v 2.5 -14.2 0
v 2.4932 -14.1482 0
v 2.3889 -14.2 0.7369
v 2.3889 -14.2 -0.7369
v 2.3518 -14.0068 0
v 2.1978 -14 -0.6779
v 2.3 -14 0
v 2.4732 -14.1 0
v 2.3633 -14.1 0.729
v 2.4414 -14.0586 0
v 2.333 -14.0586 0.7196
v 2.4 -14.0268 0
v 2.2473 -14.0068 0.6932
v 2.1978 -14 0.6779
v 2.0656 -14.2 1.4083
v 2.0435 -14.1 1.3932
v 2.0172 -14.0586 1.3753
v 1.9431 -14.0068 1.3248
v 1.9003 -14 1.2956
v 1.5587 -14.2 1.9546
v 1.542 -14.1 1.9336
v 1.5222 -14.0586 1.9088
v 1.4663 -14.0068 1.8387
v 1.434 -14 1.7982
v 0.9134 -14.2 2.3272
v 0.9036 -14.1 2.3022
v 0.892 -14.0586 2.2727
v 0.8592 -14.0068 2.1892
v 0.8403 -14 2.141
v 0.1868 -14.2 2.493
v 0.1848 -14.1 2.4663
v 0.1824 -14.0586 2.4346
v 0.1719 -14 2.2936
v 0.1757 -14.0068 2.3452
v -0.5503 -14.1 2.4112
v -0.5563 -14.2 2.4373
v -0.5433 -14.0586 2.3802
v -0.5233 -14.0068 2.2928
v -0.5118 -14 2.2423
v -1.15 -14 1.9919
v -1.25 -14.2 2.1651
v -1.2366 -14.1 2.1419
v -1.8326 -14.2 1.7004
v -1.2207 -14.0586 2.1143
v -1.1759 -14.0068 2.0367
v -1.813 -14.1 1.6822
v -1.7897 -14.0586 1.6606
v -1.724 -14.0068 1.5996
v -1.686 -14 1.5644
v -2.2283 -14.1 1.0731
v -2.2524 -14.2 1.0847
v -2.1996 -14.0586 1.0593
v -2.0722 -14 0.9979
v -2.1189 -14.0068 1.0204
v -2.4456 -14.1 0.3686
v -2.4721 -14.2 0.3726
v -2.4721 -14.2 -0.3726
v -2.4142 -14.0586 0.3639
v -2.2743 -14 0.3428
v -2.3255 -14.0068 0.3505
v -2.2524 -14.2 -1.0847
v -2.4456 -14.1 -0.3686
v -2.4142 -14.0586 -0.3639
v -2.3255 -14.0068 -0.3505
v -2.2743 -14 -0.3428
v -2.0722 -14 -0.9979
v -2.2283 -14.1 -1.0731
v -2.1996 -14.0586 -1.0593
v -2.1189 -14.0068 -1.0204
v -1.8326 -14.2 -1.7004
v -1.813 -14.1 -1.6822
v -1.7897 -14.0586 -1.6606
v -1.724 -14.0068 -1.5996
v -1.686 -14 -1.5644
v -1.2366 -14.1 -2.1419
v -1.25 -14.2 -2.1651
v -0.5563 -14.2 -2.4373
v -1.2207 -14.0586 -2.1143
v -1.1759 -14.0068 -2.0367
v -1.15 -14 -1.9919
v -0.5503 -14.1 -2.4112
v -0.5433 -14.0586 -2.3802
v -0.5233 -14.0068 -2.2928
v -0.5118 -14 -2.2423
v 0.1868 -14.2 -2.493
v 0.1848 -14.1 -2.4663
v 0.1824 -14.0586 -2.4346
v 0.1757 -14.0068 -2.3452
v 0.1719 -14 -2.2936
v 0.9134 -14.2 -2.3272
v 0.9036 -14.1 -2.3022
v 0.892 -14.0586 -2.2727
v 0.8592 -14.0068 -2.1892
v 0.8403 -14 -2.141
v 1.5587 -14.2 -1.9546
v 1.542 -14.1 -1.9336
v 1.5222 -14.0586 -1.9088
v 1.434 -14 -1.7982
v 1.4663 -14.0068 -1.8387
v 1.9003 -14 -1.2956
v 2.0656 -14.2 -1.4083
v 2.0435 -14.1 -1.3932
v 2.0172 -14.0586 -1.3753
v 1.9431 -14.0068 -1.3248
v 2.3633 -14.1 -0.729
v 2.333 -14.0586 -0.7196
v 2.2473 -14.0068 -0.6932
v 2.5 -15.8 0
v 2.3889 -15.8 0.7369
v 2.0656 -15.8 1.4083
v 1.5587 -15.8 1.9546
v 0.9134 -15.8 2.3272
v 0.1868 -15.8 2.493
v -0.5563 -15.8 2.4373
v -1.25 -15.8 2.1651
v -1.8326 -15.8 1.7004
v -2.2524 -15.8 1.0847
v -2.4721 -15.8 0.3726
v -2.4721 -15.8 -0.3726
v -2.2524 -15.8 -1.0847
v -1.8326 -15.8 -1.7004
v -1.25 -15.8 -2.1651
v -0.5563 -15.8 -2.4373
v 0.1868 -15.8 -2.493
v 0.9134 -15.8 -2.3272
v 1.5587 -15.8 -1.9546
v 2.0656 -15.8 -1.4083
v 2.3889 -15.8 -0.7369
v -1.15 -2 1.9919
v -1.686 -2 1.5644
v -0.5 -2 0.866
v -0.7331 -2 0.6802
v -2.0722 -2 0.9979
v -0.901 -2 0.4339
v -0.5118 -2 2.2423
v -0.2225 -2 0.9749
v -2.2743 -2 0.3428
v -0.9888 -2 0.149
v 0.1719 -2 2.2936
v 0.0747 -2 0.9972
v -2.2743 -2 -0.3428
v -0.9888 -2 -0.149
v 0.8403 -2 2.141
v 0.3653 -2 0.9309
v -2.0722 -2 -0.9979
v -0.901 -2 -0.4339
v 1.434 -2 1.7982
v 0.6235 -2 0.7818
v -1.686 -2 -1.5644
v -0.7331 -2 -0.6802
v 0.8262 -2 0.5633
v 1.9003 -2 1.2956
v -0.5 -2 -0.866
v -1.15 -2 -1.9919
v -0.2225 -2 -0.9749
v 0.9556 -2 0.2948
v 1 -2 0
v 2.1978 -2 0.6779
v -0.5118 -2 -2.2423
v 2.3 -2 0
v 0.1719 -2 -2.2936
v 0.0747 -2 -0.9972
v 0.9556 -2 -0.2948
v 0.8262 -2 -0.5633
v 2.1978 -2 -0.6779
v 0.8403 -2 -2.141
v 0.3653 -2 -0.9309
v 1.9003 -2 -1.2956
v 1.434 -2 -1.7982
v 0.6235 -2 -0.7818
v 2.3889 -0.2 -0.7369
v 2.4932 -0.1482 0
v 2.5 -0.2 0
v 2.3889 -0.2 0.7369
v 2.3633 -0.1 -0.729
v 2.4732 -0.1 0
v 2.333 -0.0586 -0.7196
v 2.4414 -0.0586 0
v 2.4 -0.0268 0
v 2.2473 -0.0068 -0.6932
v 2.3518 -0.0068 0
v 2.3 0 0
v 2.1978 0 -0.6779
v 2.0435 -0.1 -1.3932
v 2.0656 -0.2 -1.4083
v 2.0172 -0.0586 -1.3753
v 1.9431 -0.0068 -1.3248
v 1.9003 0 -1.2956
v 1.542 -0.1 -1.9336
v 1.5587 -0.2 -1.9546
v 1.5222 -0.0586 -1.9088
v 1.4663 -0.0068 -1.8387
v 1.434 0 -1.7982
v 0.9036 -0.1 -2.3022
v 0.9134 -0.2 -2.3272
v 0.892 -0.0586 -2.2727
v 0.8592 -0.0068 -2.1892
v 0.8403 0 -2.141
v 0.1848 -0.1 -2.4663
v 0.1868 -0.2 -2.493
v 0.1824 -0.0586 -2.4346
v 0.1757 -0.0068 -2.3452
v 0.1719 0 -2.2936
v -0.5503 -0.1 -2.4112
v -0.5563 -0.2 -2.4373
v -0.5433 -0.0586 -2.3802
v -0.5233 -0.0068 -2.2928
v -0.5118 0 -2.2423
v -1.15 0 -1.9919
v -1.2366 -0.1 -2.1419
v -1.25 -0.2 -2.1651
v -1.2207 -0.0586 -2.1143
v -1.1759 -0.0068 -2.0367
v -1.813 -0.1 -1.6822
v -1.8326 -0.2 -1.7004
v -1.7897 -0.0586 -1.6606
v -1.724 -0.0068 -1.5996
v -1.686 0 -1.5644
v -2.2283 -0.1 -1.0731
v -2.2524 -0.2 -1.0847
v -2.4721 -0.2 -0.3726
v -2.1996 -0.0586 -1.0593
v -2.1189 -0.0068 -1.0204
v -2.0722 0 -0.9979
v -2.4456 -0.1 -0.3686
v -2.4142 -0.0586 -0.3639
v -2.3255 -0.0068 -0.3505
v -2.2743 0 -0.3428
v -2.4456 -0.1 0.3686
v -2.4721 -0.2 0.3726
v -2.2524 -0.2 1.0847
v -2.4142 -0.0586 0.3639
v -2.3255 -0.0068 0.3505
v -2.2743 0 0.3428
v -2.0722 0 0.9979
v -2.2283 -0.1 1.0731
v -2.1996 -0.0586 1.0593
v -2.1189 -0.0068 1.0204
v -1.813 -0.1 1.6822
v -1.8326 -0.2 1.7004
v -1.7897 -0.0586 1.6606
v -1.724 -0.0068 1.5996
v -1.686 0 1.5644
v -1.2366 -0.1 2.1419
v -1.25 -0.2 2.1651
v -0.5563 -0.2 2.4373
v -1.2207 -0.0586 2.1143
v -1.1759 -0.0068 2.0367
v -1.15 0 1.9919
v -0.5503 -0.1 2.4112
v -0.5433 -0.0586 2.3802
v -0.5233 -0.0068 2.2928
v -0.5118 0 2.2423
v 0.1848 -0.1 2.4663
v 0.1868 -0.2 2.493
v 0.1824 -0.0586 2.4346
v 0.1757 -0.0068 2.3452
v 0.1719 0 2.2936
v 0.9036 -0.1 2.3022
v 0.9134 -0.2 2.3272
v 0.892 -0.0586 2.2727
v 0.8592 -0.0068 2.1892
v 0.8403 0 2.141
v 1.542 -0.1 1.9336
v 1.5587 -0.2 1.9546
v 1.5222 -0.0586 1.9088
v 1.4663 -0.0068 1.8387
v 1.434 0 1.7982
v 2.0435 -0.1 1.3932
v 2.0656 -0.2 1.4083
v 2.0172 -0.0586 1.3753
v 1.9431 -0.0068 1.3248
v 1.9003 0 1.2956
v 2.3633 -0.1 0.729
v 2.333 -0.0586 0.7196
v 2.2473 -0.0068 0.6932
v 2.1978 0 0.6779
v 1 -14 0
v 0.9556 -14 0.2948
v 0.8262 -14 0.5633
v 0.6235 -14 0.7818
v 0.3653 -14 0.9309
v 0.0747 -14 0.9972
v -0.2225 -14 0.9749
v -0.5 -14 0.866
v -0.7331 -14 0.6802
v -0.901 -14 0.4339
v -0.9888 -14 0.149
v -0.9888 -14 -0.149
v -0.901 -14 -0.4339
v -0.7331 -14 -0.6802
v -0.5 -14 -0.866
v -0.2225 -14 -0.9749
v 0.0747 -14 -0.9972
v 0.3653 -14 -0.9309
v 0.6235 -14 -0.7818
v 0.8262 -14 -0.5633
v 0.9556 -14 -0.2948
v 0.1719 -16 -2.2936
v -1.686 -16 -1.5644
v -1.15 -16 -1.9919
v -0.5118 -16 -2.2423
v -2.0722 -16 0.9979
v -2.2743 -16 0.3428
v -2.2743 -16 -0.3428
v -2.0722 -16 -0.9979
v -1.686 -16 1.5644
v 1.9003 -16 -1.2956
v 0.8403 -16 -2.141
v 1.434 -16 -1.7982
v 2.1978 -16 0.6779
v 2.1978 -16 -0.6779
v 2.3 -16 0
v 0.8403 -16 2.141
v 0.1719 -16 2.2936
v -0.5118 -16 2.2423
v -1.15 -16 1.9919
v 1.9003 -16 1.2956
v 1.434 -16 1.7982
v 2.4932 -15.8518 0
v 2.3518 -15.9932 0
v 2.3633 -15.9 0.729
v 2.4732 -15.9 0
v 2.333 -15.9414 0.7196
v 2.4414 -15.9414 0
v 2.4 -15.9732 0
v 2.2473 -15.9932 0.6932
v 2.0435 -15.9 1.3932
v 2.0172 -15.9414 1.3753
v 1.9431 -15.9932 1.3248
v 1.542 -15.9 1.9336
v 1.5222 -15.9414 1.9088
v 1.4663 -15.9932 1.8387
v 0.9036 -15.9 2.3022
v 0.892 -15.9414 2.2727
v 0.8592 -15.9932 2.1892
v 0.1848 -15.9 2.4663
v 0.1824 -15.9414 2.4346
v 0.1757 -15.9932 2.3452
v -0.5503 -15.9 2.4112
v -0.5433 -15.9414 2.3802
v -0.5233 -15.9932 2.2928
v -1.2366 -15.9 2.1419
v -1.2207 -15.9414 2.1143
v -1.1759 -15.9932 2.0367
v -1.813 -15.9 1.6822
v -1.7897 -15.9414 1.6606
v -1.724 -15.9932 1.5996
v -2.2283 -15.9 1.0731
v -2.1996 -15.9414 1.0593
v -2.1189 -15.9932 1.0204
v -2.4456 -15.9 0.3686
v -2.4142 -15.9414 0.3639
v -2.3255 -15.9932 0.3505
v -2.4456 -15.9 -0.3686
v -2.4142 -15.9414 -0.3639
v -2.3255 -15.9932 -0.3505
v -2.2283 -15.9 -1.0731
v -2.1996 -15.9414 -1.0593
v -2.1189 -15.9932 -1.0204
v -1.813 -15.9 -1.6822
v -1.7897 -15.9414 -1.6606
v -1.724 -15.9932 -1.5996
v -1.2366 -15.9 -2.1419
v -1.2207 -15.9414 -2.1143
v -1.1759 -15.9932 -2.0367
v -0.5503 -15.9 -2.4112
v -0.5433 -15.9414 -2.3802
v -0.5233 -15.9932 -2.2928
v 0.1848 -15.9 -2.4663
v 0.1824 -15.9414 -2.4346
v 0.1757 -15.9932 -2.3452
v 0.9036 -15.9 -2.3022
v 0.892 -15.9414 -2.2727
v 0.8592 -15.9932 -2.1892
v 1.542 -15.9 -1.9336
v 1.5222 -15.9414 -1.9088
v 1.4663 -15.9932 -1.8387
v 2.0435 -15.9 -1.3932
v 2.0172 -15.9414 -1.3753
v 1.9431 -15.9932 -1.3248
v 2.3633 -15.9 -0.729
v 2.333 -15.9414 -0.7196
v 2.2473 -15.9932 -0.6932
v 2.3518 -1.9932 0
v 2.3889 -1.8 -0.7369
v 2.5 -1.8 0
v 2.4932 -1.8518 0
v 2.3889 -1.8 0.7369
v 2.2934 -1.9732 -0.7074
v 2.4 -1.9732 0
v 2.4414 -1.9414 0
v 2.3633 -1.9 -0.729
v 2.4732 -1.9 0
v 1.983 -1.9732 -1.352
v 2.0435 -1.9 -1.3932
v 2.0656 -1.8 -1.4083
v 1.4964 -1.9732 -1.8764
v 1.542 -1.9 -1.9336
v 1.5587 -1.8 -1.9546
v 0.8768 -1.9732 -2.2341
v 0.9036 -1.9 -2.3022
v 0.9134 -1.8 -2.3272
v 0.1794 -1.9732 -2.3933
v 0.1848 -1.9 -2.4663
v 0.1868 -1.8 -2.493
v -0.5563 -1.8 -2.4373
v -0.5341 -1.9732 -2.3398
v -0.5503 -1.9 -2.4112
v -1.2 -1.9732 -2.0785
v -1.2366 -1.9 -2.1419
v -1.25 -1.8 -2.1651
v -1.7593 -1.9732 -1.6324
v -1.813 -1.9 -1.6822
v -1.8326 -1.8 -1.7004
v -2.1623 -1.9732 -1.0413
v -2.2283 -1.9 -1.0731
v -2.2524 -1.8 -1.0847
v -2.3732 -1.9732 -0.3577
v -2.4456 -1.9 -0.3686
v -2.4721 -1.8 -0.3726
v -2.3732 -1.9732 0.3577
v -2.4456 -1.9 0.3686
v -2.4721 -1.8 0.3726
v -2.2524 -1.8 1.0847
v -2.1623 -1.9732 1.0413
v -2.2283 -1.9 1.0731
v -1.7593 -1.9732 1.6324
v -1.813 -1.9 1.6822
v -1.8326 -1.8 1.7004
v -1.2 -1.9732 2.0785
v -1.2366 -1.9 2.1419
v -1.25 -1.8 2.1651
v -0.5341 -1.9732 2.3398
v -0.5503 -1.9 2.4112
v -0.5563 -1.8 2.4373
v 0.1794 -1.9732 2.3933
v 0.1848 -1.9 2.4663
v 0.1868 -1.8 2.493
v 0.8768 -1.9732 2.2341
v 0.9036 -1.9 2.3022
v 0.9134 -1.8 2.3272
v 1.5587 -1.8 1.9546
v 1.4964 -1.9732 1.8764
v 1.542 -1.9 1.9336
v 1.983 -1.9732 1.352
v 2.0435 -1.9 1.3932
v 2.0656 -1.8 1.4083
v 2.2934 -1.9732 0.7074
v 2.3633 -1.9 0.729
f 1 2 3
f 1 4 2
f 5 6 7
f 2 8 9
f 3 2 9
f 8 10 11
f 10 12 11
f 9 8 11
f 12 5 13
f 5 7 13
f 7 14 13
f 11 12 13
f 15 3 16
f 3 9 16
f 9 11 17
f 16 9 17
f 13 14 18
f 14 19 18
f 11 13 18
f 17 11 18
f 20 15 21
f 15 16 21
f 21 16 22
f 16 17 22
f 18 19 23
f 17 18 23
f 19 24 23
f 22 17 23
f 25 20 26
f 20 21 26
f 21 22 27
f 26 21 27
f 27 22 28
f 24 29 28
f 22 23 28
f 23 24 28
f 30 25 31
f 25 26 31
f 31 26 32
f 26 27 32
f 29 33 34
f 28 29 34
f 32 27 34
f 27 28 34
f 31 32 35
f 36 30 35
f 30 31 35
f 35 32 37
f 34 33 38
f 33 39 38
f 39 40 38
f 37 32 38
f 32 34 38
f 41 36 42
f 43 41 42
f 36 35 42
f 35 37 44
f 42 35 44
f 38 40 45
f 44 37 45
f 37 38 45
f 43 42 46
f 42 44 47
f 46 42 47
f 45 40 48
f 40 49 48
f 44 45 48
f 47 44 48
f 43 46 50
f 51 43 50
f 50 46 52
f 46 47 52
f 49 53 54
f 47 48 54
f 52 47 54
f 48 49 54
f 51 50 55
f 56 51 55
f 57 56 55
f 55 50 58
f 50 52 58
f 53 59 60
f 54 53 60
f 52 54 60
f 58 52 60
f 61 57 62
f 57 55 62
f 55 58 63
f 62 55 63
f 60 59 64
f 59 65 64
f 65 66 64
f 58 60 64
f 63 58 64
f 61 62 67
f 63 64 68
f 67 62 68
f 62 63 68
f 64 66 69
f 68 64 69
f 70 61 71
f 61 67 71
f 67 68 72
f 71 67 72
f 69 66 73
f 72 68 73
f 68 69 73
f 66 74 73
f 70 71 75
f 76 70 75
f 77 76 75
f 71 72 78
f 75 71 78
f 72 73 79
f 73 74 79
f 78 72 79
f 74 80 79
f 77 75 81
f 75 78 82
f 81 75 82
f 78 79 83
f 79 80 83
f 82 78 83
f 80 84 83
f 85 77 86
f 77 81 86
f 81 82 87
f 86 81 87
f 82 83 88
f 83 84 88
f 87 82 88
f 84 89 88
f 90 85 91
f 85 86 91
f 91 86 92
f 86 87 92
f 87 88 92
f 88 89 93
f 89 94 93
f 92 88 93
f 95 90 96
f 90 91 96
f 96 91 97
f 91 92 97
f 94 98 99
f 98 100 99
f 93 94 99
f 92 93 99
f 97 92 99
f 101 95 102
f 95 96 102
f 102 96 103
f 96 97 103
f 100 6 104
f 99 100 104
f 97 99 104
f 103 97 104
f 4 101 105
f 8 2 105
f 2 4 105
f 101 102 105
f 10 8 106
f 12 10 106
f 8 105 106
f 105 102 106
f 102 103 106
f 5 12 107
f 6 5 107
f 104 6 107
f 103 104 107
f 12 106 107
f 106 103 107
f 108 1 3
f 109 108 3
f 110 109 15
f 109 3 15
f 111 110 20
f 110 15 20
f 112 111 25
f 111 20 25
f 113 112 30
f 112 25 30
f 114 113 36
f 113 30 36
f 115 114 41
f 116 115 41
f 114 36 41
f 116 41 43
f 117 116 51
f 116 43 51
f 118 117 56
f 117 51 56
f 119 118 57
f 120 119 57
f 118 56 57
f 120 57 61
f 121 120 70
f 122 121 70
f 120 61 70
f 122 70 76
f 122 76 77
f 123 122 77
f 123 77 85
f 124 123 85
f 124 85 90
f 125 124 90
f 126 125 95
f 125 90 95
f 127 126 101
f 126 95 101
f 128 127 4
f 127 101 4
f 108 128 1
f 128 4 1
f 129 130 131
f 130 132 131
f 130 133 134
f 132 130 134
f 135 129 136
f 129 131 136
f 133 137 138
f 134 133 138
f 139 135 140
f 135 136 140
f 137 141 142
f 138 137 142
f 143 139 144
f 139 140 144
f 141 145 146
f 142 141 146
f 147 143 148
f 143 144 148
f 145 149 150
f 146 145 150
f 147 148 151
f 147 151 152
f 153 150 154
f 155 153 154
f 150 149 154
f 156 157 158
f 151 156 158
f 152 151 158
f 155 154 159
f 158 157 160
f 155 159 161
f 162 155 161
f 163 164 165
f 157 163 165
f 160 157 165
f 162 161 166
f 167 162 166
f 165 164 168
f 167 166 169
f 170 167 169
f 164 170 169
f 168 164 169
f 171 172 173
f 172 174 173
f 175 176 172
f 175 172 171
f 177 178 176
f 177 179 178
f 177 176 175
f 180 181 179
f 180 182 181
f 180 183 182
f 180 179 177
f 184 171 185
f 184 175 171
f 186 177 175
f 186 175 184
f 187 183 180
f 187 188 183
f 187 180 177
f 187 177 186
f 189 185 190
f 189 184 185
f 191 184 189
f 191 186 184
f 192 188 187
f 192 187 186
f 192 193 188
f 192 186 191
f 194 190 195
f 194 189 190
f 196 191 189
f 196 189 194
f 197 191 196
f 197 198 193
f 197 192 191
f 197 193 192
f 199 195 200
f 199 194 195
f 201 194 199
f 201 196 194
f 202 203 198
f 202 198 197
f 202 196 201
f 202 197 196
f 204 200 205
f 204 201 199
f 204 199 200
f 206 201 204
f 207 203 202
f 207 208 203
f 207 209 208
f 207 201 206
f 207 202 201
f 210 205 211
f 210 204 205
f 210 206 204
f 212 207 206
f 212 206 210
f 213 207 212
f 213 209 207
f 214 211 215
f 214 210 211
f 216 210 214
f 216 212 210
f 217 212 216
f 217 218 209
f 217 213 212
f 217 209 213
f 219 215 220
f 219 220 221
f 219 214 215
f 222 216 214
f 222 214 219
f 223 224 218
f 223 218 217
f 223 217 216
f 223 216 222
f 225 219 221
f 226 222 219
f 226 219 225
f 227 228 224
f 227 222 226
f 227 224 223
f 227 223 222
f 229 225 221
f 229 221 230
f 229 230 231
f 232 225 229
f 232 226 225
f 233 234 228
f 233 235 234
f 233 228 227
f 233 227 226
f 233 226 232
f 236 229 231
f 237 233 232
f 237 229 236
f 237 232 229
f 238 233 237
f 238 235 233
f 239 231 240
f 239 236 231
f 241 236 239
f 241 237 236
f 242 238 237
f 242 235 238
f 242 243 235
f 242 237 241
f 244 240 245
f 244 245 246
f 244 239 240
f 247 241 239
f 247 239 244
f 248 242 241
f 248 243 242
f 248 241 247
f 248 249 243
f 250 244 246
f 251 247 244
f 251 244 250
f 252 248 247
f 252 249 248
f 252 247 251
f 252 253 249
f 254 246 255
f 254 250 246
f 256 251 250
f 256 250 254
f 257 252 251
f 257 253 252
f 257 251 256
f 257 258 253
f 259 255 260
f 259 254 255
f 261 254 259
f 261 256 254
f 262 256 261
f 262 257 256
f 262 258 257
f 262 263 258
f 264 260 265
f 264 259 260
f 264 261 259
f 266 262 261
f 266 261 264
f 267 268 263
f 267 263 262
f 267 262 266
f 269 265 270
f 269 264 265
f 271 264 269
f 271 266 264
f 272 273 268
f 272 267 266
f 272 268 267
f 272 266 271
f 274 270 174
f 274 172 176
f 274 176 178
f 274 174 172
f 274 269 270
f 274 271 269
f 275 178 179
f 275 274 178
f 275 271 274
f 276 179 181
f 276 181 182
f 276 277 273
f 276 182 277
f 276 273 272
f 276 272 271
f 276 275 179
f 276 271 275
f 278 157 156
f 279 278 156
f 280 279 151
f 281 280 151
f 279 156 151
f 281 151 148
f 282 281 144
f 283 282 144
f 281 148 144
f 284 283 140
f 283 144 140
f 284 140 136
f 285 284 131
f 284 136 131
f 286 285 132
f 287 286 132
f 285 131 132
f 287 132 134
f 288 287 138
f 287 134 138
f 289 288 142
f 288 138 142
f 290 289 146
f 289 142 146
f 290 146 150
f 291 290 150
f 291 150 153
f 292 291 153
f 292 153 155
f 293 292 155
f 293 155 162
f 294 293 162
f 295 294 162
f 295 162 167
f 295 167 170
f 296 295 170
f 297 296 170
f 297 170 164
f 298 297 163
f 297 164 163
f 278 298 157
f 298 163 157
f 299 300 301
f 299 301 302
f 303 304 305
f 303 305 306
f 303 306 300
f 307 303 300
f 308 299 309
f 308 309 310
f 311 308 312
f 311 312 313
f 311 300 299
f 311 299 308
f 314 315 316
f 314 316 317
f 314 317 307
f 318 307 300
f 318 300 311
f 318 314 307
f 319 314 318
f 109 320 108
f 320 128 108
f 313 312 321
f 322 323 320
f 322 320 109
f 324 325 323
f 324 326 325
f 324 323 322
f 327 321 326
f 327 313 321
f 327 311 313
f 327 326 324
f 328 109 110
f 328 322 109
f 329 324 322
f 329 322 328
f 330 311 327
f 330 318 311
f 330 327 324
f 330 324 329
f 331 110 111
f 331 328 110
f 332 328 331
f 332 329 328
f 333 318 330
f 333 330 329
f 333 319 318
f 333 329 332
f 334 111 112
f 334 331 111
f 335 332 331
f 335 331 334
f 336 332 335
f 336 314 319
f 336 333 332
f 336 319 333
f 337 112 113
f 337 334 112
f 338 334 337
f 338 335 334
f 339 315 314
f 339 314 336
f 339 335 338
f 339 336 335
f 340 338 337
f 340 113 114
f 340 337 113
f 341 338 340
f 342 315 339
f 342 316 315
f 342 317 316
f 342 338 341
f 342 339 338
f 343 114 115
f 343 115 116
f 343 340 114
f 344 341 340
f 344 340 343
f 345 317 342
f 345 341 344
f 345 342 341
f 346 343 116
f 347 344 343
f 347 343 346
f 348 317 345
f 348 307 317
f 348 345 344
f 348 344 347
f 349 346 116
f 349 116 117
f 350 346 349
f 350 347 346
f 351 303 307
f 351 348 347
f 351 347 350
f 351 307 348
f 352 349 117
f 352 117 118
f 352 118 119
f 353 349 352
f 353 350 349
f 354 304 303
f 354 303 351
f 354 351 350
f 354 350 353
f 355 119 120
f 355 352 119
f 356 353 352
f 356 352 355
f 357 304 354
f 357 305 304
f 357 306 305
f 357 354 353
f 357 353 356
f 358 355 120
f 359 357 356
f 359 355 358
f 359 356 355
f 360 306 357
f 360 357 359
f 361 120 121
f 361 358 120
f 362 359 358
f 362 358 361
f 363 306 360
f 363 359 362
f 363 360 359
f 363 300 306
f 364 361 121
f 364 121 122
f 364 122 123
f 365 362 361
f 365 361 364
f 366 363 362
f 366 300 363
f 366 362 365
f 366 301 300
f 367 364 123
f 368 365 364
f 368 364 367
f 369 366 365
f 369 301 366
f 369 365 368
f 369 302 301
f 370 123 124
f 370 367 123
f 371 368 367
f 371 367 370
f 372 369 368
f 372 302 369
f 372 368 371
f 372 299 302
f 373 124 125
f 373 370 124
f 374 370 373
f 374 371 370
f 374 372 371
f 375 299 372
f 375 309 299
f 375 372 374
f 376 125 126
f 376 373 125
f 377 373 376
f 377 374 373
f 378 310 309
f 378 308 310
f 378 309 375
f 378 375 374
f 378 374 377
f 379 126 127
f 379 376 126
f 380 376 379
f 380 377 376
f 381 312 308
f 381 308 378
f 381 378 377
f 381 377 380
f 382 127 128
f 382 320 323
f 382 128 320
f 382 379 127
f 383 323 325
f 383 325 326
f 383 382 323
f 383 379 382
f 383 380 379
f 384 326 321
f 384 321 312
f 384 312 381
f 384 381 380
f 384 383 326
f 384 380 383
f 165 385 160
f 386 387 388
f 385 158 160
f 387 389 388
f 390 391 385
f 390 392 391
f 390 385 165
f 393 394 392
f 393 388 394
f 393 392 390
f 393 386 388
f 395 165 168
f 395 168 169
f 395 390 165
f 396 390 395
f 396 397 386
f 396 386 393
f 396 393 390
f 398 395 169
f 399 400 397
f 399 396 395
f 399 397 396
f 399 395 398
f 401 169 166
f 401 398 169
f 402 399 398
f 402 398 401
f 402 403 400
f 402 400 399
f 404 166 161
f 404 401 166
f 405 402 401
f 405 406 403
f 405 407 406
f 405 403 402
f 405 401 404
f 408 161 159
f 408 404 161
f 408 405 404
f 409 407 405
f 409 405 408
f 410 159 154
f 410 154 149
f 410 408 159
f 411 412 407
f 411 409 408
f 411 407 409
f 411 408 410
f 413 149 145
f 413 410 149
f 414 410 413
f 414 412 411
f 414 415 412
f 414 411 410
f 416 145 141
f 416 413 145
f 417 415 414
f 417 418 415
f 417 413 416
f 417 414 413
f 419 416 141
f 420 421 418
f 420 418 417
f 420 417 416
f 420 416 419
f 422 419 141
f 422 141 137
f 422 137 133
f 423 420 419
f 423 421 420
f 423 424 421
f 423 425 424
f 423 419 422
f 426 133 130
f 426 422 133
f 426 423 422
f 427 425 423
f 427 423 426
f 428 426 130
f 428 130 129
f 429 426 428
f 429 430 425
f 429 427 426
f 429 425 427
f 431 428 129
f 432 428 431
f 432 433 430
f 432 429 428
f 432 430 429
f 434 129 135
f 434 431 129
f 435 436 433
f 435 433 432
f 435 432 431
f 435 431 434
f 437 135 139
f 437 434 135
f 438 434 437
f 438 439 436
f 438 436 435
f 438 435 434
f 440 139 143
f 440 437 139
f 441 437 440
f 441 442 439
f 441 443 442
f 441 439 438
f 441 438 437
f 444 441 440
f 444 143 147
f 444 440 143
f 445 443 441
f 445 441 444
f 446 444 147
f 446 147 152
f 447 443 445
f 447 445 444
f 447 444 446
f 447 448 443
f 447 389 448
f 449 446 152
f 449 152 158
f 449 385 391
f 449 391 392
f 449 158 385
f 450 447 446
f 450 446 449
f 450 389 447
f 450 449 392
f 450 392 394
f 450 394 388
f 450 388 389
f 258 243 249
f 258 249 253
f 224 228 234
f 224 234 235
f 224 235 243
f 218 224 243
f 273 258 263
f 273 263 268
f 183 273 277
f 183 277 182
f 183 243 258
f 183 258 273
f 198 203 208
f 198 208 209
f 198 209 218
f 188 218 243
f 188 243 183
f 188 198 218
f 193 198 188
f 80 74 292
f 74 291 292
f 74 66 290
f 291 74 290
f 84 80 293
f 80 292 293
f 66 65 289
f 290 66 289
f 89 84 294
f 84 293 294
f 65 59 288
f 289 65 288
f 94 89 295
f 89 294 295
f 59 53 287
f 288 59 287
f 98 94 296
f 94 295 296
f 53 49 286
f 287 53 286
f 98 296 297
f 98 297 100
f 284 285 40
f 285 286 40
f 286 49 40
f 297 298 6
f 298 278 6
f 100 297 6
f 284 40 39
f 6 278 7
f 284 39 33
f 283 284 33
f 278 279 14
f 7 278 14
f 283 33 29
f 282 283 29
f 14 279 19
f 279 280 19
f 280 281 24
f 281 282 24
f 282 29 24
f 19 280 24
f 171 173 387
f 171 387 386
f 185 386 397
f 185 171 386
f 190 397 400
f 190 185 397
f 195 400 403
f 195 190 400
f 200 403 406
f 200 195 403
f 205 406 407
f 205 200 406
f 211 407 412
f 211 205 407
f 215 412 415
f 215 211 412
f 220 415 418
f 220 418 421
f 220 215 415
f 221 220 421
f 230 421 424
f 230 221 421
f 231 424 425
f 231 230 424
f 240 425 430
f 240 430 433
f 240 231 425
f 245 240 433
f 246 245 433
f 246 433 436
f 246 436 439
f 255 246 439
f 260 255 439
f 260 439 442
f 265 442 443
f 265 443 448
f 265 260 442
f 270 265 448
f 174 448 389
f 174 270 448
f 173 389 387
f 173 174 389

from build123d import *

# Parameters (mm, degrees)
SKETCH1_R           = 2.5
BOSS_EXTRUDE1_DEPTH = 2
SKETCH2_R           = 1
BOSS_EXTRUDE2_DEPTH = 12
SKETCH3_R           = 2.5
BOSS_EXTRUDE3_DEPTH = 2
FILLET1_R           = 0.2


with BuildPart() as part:
    # Sketch1 → Boss-Extrude1 (new body)
    with BuildSketch(Plane(origin=(0, 0, 0), x_dir=(1, 0, 0), z_dir=(0, 1, 0))):
        Circle(SKETCH1_R)
    extrude(amount=-BOSS_EXTRUDE1_DEPTH)

    # Sketch2 → Boss-Extrude2 (add)
    with BuildSketch(Plane.XZ.offset(2)):
        Circle(SKETCH2_R)
    extrude(amount=BOSS_EXTRUDE2_DEPTH)

    # Sketch3 → Boss-Extrude3 (add)
    with BuildSketch(Plane.XZ.offset(14)):
        Circle(SKETCH3_R)
    extrude(amount=BOSS_EXTRUDE3_DEPTH)

    # Fillet1
    fillet1_edges = [part.edges().sort_by_distance(p)[0] for p in [
        (-2.5, 0, 0),
        (-2.5, -2, 0),
        (-2.5, -14, 0),
        (-2.5, -16, 0),
    ]]
    fillet(fillet1_edges, radius=FILLET1_R)


solid = part.part
